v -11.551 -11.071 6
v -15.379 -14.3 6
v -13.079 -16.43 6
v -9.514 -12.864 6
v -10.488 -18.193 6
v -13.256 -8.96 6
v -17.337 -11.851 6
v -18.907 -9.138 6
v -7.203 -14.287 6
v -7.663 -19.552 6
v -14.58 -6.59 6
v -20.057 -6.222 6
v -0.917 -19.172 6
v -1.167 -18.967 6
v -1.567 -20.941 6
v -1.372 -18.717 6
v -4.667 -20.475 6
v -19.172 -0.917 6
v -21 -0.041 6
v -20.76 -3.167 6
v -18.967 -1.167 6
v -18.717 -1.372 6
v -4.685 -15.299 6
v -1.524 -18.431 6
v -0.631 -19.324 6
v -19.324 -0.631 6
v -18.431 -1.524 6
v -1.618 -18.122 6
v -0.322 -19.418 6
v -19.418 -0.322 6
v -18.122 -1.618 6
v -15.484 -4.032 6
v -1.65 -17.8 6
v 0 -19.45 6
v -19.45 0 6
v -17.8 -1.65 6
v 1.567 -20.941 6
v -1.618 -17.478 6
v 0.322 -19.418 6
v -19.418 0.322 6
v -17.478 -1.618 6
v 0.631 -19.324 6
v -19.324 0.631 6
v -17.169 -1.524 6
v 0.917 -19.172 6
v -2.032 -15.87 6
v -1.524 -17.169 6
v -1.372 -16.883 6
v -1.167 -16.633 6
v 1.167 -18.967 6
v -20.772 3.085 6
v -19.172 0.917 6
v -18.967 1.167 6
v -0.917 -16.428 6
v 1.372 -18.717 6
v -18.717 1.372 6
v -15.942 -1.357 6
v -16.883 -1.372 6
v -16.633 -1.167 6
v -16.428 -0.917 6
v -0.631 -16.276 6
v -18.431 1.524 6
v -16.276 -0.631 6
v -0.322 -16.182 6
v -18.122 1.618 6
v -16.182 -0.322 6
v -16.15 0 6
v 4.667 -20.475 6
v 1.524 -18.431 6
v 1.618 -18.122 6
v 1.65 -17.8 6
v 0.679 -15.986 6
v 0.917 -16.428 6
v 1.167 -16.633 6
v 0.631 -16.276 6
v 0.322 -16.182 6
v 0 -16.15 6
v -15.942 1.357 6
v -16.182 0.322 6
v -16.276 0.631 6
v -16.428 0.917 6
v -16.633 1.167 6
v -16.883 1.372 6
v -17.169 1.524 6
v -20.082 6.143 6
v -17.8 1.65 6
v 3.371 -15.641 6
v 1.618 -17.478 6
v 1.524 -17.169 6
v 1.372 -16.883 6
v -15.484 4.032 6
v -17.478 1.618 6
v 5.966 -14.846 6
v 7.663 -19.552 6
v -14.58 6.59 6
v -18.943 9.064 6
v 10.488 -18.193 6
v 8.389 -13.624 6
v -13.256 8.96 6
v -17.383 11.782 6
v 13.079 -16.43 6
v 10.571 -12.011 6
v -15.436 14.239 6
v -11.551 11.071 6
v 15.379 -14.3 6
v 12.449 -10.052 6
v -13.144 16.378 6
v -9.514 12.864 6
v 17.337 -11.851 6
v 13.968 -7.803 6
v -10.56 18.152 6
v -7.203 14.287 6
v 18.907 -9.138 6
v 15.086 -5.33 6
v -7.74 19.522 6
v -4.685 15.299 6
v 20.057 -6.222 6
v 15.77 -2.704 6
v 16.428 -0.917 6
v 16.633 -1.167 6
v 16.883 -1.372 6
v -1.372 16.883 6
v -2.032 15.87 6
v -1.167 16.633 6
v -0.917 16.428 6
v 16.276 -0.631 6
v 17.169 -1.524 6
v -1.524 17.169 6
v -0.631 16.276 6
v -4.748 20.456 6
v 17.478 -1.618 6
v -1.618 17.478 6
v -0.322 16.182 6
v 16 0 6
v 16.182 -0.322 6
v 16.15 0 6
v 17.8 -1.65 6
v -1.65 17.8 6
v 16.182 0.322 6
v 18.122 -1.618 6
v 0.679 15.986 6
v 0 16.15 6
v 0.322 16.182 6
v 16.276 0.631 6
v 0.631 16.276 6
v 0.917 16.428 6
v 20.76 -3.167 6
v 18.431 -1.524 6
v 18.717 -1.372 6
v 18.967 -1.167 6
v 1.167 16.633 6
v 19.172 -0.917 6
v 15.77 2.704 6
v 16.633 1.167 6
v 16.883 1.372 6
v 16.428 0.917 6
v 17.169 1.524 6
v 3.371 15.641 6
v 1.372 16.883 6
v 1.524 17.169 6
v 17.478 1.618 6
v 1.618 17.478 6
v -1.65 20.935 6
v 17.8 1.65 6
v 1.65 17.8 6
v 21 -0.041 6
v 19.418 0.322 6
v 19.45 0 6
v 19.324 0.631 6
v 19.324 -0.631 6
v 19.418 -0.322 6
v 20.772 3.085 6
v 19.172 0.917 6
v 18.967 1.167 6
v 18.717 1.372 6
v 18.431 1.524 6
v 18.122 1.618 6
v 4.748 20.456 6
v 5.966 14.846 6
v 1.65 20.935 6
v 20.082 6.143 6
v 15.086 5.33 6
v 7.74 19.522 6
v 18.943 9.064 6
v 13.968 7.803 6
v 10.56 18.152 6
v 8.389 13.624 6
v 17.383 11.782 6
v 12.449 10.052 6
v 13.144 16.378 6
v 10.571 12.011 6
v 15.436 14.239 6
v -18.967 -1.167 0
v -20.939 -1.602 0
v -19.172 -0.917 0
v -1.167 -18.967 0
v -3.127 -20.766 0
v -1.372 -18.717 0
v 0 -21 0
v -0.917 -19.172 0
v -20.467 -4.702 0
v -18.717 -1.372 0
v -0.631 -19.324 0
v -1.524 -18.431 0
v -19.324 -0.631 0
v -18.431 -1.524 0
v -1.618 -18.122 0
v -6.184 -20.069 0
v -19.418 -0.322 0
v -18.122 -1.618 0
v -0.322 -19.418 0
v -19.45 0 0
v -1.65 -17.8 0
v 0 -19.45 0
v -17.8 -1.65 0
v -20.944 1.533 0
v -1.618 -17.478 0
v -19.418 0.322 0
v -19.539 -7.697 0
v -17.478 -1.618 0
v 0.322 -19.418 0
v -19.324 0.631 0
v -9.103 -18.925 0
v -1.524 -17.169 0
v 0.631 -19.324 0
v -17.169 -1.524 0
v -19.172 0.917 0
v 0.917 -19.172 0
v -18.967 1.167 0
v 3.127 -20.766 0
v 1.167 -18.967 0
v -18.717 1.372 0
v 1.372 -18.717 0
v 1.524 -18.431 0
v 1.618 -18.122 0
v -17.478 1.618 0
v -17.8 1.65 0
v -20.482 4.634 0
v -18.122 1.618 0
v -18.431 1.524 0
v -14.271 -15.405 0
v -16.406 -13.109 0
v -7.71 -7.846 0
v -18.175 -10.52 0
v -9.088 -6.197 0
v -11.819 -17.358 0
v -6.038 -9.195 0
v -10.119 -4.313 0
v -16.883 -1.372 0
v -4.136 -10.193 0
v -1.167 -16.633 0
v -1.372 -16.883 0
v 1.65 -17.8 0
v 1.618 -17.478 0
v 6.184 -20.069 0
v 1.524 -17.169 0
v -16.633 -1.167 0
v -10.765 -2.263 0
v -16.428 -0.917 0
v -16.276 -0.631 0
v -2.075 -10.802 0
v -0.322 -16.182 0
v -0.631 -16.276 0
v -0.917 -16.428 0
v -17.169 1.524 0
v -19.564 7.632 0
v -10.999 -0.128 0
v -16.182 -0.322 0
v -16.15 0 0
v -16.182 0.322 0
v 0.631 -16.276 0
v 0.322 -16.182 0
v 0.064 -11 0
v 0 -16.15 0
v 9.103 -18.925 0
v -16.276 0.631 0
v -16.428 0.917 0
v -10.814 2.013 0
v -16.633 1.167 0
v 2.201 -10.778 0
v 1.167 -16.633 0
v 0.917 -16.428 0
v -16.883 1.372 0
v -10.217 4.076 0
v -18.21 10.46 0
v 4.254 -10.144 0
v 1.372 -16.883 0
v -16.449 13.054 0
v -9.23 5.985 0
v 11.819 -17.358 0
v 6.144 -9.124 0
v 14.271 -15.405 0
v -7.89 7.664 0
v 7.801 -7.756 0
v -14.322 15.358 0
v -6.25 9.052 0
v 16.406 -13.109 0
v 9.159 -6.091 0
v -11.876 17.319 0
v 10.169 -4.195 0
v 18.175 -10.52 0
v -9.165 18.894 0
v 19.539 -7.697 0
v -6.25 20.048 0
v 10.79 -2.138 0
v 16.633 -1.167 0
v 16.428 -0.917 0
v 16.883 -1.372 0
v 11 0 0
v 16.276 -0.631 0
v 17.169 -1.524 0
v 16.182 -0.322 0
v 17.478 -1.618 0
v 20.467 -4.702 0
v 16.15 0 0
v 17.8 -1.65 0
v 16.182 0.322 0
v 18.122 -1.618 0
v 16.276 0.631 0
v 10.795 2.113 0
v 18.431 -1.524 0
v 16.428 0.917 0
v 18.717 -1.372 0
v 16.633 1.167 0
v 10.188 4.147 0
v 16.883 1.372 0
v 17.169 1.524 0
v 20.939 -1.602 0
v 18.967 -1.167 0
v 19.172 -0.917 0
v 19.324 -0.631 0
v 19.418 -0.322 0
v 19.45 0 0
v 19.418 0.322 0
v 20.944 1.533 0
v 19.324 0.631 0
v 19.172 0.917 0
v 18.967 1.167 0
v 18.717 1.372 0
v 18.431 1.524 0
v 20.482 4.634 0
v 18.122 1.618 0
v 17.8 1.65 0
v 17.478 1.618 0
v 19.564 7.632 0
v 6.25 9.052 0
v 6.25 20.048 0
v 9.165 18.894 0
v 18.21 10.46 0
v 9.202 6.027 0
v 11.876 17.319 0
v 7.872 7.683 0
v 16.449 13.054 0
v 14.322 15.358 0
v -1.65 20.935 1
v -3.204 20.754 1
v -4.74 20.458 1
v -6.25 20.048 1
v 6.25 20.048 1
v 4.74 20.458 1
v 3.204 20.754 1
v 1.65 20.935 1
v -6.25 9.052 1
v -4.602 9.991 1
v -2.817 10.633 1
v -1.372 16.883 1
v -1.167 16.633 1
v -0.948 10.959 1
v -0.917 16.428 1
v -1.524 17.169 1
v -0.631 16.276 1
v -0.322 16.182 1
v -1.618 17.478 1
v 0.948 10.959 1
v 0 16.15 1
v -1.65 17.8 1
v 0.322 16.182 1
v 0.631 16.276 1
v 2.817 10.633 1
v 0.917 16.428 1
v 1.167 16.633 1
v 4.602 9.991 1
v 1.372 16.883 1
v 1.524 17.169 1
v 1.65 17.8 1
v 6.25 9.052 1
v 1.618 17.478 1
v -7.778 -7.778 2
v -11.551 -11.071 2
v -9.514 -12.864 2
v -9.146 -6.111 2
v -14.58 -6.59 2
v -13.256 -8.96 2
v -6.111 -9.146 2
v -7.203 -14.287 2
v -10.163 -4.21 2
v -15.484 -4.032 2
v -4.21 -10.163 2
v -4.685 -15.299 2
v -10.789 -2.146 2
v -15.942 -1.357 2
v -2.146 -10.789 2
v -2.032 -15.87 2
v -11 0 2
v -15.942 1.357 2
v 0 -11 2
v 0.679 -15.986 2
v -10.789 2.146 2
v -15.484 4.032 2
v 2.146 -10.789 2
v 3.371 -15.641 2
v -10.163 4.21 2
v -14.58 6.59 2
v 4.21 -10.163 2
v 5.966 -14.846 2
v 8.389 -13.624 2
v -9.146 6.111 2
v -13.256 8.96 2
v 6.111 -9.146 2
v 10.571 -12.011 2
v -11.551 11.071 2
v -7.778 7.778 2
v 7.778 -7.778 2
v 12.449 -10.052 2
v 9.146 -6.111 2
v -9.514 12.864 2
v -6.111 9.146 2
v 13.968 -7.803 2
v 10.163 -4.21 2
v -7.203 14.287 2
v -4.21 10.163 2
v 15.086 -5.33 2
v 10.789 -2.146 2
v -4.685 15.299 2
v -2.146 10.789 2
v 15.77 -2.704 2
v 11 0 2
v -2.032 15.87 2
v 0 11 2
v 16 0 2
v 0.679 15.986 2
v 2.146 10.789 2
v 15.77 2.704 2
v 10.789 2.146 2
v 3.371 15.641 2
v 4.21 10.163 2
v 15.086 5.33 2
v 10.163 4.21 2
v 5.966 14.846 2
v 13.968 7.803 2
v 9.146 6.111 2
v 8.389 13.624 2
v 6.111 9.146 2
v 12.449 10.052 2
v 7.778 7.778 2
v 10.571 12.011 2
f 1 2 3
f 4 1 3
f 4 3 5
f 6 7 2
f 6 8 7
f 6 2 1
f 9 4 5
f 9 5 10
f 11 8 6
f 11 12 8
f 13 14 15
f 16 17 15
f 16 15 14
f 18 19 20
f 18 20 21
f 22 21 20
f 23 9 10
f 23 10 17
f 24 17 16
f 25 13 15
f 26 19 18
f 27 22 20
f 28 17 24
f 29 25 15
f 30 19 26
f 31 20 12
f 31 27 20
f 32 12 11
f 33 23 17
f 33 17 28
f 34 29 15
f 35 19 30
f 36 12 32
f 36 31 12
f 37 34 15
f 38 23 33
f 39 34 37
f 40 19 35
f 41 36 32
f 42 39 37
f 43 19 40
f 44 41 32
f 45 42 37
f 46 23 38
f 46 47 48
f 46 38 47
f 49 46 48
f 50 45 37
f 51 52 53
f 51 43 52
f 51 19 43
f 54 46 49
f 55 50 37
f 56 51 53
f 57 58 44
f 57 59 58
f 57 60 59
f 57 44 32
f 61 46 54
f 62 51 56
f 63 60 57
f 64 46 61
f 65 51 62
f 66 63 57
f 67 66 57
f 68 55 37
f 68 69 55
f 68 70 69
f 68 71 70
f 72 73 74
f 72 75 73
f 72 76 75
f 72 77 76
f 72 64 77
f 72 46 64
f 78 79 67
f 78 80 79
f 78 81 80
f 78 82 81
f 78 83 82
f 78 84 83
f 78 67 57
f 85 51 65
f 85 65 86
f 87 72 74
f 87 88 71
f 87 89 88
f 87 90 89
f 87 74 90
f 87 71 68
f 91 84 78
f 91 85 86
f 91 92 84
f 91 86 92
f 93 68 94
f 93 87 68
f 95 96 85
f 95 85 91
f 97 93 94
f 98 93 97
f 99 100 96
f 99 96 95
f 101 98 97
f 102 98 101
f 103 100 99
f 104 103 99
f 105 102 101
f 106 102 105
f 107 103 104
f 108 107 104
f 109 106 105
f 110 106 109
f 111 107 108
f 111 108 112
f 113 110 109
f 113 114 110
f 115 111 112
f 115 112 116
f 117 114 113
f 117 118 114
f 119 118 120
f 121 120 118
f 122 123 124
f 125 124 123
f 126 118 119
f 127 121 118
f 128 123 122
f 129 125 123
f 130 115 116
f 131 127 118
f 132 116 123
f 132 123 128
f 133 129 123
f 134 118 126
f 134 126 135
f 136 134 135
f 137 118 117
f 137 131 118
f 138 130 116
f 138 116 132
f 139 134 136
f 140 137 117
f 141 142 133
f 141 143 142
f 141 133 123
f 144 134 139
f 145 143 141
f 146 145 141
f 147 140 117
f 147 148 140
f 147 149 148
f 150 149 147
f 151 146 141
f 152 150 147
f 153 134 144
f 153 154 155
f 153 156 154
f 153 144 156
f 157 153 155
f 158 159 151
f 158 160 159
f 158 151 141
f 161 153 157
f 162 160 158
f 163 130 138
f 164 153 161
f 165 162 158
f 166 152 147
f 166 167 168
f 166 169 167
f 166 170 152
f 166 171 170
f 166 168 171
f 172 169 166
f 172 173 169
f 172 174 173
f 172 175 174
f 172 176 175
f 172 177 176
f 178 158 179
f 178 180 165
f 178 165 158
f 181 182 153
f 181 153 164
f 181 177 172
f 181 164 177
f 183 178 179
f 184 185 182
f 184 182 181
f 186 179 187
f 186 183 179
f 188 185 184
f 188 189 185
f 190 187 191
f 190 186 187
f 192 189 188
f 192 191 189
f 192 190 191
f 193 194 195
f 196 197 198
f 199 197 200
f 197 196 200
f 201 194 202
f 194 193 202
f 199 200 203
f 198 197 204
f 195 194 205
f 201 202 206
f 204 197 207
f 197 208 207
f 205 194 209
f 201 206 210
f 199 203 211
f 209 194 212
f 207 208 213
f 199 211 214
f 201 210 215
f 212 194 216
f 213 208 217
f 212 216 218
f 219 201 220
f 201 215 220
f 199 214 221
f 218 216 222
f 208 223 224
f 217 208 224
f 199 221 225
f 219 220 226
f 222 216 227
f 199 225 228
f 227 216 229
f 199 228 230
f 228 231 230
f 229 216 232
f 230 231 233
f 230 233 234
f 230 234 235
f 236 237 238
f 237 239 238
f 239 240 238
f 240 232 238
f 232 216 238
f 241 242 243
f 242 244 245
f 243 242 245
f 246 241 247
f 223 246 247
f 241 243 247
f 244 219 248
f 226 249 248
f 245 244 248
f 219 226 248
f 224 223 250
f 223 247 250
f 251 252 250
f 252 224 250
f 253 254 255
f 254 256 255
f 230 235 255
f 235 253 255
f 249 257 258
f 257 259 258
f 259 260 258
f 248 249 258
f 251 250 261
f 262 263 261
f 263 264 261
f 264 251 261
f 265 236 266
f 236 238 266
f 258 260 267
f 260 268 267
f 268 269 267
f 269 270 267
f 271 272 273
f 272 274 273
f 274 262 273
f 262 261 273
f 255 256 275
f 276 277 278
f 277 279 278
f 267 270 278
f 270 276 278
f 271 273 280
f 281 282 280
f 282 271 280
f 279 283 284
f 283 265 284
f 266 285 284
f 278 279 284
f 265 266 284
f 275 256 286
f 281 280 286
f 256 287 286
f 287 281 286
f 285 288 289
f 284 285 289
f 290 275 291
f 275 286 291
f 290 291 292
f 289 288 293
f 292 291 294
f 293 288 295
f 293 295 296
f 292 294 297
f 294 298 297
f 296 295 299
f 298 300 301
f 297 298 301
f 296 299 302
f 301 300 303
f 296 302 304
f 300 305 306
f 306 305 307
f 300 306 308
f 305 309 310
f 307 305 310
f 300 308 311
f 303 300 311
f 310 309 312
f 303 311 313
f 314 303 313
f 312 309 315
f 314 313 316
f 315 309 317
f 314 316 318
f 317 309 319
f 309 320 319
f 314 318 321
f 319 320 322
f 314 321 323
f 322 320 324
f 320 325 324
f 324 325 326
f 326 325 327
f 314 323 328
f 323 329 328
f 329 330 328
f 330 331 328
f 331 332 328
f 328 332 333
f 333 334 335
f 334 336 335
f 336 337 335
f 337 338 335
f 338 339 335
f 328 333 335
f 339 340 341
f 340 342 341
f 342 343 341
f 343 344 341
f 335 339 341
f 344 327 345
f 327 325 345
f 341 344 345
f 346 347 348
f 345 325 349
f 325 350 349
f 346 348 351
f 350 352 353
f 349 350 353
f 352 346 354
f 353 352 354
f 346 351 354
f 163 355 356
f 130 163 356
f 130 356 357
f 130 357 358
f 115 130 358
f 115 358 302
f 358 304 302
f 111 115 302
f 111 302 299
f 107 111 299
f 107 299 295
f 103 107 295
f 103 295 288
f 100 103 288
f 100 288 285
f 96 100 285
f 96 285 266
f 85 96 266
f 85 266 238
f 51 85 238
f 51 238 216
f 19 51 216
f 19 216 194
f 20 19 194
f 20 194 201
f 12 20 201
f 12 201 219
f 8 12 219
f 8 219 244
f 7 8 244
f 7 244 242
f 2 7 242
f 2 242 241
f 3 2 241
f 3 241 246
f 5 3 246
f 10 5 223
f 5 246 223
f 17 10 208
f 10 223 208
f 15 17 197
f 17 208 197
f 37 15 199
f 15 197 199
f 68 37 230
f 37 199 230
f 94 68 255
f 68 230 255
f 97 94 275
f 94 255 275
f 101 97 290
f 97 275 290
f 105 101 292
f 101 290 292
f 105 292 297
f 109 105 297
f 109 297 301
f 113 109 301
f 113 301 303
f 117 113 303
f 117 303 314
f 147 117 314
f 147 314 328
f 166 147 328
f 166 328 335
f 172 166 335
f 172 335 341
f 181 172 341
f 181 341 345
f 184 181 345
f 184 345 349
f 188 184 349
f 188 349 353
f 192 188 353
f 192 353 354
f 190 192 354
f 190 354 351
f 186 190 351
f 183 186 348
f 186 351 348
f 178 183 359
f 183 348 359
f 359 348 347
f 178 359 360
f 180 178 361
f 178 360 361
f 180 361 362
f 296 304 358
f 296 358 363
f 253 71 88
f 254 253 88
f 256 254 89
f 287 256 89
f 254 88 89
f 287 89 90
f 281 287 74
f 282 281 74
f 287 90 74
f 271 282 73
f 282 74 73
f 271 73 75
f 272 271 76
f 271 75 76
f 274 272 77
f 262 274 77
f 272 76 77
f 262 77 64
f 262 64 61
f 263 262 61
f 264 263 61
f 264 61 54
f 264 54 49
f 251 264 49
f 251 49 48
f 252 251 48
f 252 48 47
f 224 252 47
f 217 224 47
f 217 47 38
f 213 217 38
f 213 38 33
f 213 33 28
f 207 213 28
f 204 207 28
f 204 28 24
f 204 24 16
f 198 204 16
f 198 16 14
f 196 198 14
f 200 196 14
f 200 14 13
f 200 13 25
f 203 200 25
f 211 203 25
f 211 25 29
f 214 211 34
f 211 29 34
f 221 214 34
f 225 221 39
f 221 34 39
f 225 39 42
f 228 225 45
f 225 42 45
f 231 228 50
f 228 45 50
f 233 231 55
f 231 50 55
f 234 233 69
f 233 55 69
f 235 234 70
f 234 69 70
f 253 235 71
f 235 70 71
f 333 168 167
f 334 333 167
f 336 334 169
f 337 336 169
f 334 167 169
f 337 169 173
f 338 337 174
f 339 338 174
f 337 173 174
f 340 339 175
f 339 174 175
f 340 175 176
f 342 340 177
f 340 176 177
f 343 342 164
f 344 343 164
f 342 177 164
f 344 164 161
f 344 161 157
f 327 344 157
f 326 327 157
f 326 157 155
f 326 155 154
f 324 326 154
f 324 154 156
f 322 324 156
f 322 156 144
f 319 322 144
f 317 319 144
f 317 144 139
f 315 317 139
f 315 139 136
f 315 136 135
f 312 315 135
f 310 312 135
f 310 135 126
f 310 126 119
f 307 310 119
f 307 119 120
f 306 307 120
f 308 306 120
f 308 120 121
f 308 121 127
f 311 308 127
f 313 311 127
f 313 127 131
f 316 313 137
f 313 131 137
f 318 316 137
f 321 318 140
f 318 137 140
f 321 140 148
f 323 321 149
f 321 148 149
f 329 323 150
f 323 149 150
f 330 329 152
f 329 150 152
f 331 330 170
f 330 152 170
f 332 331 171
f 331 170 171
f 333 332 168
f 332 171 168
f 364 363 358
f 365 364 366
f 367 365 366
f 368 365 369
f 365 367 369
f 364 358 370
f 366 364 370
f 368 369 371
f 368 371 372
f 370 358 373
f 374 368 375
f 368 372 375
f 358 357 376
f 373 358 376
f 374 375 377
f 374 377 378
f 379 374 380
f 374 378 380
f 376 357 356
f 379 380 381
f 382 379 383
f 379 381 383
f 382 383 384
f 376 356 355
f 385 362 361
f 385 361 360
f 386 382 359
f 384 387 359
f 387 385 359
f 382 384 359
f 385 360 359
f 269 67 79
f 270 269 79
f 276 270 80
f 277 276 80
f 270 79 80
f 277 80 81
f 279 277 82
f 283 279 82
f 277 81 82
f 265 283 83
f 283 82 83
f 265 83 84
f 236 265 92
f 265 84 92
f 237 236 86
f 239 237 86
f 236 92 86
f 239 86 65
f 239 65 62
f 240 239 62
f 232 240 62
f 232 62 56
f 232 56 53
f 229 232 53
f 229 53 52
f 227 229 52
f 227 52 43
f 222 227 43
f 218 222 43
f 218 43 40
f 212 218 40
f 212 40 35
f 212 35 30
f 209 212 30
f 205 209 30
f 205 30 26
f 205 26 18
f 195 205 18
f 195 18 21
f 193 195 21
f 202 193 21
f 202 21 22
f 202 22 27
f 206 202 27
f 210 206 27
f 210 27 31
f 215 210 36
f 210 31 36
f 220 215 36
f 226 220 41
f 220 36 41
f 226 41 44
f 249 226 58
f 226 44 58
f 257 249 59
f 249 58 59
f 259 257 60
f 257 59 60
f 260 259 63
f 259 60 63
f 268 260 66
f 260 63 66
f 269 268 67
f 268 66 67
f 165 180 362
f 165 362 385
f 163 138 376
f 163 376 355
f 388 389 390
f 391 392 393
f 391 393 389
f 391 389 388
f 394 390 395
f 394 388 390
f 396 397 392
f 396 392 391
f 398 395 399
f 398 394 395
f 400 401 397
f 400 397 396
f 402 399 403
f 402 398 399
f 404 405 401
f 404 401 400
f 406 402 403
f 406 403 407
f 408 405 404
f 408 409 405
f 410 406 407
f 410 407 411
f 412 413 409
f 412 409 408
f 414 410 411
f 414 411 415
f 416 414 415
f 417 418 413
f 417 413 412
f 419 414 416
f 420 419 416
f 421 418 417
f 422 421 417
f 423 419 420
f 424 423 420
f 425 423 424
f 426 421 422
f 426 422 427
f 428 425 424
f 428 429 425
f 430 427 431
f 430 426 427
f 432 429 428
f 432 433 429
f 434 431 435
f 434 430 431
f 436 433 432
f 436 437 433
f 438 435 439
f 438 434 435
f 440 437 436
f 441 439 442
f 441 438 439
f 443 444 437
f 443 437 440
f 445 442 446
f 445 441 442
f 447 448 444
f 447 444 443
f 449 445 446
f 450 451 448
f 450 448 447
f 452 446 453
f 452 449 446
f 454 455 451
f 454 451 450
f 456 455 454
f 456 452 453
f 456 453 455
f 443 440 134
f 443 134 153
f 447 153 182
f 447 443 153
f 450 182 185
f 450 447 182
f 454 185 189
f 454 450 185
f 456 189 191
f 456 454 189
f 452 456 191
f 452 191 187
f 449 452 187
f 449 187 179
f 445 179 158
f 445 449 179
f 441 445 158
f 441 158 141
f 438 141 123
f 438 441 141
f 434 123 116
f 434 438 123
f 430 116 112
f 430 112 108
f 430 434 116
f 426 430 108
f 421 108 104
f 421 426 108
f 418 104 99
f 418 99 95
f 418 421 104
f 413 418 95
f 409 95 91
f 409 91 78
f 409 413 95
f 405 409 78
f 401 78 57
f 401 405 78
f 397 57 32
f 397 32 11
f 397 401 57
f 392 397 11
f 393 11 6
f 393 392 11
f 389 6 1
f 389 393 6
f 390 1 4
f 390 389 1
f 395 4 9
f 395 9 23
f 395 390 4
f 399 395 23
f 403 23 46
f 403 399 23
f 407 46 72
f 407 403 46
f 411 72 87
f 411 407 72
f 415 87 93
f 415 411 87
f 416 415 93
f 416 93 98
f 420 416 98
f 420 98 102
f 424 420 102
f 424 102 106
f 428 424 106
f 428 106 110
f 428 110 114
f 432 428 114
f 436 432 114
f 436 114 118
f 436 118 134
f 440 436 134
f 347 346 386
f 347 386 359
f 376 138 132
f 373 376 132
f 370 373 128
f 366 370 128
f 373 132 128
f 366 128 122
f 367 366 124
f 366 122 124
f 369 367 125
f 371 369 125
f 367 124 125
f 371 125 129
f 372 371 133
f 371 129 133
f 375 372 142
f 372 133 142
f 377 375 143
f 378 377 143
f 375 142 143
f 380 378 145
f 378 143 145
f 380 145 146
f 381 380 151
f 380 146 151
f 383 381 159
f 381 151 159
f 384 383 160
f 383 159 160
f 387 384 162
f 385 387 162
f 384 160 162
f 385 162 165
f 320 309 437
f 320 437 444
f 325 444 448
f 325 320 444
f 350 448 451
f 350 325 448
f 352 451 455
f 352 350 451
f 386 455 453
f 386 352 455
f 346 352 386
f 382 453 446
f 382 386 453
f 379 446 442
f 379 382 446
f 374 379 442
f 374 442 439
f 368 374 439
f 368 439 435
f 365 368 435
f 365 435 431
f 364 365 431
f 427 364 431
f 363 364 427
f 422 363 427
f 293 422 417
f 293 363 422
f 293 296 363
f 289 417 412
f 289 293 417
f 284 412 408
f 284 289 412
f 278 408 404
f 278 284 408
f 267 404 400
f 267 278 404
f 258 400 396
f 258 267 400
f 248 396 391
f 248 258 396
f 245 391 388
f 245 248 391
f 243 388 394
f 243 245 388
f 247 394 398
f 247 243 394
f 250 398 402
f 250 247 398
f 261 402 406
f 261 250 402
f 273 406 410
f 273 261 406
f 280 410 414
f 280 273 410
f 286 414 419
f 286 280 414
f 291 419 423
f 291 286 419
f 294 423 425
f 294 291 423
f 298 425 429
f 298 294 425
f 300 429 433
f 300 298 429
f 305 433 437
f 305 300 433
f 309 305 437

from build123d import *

# Parameters (mm, degrees)
SKETCH_1_R          = 21
SKETCH_1_R_2        = 11
EXTRUDE_1_DEPTH     = 2
SKETCH_2_R          = 21
SKETCH_2_R_2        = 16
EXTRUDE_2_DEPTH     = 4
CUT_EXTRUDE_1_REACH = 32.299
SKETCH_3_R          = 1.65
CUT_EXTRUDE_2_REACH = 32.299
CUT_EXTRUDE_3_DEPTH = 1


with BuildPart() as part:
    # 草图1 → 凸台-拉伸1 (new body)
    with BuildSketch(Plane.XY):
        Circle(SKETCH_1_R)
        Circle(SKETCH_1_R_2, mode=Mode.SUBTRACT)
    extrude(amount=EXTRUDE_1_DEPTH)

    # 草图2 → 凸台-拉伸2 (add)
    with BuildSketch(Plane.XY.offset(2)):
        Circle(SKETCH_2_R)
        Circle(SKETCH_2_R_2, mode=Mode.SUBTRACT)
    extrude(amount=EXTRUDE_2_DEPTH)

    # 草图3 → 切除-拉伸1 (cut, up to next)
    with BuildSketch(Plane.XY.offset(6), mode=Mode.PRIVATE) as cut_extrude_1_sk1:
        with Locations((17.8, 0)):
            Circle(SKETCH_3_R)
    cut_extrude_1_tool1 = extrude(cut_extrude_1_sk1.sketch, amount=-CUT_EXTRUDE_1_REACH, mode=Mode.PRIVATE) & part.part
    # 草图3 → 切除-拉伸1 (cut, up to next)
    with BuildSketch(Plane.XY.offset(6), mode=Mode.PRIVATE) as cut_extrude_1_sk2:
        with Locations((0, -17.8)):
            Circle(SKETCH_3_R)
    cut_extrude_1_tool2 = extrude(cut_extrude_1_sk2.sketch, amount=-CUT_EXTRUDE_1_REACH, mode=Mode.PRIVATE) & part.part
    # 草图3 → 切除-拉伸1 (cut, up to next)
    with BuildSketch(Plane.XY.offset(6), mode=Mode.PRIVATE) as cut_extrude_1_sk3:
        with Locations((-17.8, 0)):
            Circle(SKETCH_3_R)
    cut_extrude_1_tool3 = extrude(cut_extrude_1_sk3.sketch, amount=-CUT_EXTRUDE_1_REACH, mode=Mode.PRIVATE) & part.part
    # 草图3 → 切除-拉伸1 (cut, up to next)
    with BuildSketch(Plane.XY.offset(6), mode=Mode.PRIVATE) as cut_extrude_1_sk4:
        with Locations((0, 17.8)):
            Circle(SKETCH_3_R)
    cut_extrude_1_tool4 = extrude(cut_extrude_1_sk4.sketch, amount=-CUT_EXTRUDE_1_REACH, mode=Mode.PRIVATE) & part.part
    add(cut_extrude_1_tool1.solids().sort_by_distance((17.8, 0, 6))[0], mode=Mode.SUBTRACT)
    add(cut_extrude_1_tool2.solids().sort_by_distance((0, -17.8, 6))[0], mode=Mode.SUBTRACT)
    add(cut_extrude_1_tool3.solids().sort_by_distance((-17.8, 0, 6))[0], mode=Mode.SUBTRACT)
    add(cut_extrude_1_tool4.solids().sort_by_distance((0, 17.8, 6))[0], mode=Mode.SUBTRACT)

    # 草图5 → 切除-拉伸2 (cut, up to next)
    with BuildSketch(Plane.XY.offset(6), mode=Mode.PRIVATE) as cut_extrude_2_sk1:
        with BuildLine():
            Line((-1.65, 17.8), (-1.65, 20.935078218))
            ThreePointArc((-1.65, 20.935078218), (0, 21), (1.65, 20.935078218))
            Line((1.65, 20.935078218), (1.65, 17.8))
            ThreePointArc((1.65, 17.8), (0, 19.45), (-1.65, 17.8))
        make_face()
    cut_extrude_2_tool1 = extrude(cut_extrude_2_sk1.sketch, amount=-CUT_EXTRUDE_2_REACH, mode=Mode.PRIVATE) & part.part
    add(cut_extrude_2_tool1.solids().sort_by_distance((0, 20.001216, 6))[0], mode=Mode.SUBTRACT)

    # 草图6 → 切除-拉伸3 (cut)
    with BuildSketch(Plane(origin=(0, 0, 0), x_dir=(-1, 0, 0), z_dir=(0, 0, -1))):
        with BuildLine():
            Line((-6.25, 9.051933495), (-6.25, 20.048378987))
            ThreePointArc((-6.25, 20.048378987), (0, 21), (6.25, 20.048378987))
            Line((6.25, 20.048378987), (6.25, 9.051933495))
            ThreePointArc((6.25, 9.051933495), (0, 11), (-6.25, 9.051933495))
        make_face()
    extrude(amount=-CUT_EXTRUDE_3_DEPTH, mode=Mode.SUBTRACT)


solid = part.part
